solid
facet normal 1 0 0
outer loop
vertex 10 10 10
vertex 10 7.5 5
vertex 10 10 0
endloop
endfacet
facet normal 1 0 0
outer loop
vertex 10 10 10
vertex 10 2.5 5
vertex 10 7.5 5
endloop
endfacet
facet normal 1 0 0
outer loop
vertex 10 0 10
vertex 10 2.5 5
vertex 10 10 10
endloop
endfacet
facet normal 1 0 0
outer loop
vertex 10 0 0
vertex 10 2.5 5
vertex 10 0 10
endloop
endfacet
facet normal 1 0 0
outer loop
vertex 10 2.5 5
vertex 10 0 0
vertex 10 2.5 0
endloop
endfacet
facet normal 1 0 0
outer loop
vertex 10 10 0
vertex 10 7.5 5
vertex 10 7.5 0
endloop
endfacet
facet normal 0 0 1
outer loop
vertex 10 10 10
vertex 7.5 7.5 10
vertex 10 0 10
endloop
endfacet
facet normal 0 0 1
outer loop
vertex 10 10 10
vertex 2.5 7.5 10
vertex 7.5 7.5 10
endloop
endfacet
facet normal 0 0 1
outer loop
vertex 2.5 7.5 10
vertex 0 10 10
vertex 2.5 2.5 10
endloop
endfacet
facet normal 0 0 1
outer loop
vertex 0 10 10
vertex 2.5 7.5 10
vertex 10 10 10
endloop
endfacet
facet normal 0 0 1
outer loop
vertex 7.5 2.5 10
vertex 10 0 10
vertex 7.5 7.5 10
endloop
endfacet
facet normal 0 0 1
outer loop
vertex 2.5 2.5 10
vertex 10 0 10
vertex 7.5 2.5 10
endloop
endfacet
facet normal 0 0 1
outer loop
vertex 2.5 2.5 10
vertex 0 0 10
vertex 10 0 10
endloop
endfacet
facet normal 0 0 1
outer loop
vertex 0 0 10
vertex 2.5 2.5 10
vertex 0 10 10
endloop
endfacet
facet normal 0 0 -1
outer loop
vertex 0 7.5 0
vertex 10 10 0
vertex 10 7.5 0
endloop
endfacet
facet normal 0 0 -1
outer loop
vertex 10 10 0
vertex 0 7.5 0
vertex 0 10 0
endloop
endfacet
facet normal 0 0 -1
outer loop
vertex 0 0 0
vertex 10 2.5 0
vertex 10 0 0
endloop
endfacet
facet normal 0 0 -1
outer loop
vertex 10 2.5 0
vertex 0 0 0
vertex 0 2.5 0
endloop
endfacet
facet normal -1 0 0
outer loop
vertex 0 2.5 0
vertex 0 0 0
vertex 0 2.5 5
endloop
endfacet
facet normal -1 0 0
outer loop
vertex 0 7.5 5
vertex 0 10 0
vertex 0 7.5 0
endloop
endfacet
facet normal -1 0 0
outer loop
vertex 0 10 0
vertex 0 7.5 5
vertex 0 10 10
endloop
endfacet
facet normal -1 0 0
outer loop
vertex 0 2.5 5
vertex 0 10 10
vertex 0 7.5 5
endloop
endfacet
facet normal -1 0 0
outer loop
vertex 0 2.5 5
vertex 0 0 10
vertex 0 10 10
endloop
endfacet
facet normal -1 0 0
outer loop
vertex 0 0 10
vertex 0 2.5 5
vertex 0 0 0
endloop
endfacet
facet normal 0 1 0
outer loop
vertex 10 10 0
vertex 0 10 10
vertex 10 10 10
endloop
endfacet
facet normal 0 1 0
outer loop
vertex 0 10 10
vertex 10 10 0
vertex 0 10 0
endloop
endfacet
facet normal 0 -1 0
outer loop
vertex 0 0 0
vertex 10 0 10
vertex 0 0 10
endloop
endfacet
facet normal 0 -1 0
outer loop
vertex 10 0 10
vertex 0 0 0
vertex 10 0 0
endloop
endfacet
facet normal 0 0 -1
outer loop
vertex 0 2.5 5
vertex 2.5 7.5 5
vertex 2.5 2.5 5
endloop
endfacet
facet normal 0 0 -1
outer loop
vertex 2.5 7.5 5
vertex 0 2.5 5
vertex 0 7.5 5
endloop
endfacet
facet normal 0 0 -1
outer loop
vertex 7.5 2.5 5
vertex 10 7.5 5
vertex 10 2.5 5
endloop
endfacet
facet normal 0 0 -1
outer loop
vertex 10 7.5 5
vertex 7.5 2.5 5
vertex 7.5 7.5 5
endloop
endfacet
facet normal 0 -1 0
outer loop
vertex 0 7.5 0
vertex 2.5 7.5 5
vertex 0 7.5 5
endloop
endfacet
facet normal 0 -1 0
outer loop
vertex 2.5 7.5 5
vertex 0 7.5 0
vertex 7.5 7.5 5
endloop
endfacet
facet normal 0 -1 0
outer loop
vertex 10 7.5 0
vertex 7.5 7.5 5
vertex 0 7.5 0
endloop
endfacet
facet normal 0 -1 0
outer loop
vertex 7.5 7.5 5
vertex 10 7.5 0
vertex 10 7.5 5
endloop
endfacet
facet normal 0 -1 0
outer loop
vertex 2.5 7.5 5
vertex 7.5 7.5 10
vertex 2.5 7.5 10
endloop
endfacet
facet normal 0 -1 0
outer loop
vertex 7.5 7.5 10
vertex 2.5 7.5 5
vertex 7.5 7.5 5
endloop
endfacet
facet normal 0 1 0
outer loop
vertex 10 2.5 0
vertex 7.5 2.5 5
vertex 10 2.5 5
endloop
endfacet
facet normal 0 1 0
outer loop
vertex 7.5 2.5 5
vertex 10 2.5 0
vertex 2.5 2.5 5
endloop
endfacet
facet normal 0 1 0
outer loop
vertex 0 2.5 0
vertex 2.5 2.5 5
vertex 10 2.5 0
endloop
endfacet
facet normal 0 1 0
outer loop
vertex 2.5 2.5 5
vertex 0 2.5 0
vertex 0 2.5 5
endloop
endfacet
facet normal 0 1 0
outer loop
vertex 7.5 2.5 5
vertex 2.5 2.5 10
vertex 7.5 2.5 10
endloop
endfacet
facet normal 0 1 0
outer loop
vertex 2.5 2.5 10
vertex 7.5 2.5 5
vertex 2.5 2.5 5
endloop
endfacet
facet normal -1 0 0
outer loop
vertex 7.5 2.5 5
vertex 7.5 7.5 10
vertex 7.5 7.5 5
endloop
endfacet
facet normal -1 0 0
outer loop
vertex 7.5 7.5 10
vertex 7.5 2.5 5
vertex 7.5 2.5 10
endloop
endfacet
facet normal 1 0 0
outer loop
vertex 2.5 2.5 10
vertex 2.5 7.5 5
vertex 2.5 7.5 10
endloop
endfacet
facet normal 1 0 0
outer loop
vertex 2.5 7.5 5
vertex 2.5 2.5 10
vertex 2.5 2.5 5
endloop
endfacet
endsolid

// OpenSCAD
difference() {
	cube(10);
	translate([0, 2.5, 0])
		cube([10, 5, 5]);
	translate([2.5, 2.5, 0])
		cube([5, 5, 10]);
}
